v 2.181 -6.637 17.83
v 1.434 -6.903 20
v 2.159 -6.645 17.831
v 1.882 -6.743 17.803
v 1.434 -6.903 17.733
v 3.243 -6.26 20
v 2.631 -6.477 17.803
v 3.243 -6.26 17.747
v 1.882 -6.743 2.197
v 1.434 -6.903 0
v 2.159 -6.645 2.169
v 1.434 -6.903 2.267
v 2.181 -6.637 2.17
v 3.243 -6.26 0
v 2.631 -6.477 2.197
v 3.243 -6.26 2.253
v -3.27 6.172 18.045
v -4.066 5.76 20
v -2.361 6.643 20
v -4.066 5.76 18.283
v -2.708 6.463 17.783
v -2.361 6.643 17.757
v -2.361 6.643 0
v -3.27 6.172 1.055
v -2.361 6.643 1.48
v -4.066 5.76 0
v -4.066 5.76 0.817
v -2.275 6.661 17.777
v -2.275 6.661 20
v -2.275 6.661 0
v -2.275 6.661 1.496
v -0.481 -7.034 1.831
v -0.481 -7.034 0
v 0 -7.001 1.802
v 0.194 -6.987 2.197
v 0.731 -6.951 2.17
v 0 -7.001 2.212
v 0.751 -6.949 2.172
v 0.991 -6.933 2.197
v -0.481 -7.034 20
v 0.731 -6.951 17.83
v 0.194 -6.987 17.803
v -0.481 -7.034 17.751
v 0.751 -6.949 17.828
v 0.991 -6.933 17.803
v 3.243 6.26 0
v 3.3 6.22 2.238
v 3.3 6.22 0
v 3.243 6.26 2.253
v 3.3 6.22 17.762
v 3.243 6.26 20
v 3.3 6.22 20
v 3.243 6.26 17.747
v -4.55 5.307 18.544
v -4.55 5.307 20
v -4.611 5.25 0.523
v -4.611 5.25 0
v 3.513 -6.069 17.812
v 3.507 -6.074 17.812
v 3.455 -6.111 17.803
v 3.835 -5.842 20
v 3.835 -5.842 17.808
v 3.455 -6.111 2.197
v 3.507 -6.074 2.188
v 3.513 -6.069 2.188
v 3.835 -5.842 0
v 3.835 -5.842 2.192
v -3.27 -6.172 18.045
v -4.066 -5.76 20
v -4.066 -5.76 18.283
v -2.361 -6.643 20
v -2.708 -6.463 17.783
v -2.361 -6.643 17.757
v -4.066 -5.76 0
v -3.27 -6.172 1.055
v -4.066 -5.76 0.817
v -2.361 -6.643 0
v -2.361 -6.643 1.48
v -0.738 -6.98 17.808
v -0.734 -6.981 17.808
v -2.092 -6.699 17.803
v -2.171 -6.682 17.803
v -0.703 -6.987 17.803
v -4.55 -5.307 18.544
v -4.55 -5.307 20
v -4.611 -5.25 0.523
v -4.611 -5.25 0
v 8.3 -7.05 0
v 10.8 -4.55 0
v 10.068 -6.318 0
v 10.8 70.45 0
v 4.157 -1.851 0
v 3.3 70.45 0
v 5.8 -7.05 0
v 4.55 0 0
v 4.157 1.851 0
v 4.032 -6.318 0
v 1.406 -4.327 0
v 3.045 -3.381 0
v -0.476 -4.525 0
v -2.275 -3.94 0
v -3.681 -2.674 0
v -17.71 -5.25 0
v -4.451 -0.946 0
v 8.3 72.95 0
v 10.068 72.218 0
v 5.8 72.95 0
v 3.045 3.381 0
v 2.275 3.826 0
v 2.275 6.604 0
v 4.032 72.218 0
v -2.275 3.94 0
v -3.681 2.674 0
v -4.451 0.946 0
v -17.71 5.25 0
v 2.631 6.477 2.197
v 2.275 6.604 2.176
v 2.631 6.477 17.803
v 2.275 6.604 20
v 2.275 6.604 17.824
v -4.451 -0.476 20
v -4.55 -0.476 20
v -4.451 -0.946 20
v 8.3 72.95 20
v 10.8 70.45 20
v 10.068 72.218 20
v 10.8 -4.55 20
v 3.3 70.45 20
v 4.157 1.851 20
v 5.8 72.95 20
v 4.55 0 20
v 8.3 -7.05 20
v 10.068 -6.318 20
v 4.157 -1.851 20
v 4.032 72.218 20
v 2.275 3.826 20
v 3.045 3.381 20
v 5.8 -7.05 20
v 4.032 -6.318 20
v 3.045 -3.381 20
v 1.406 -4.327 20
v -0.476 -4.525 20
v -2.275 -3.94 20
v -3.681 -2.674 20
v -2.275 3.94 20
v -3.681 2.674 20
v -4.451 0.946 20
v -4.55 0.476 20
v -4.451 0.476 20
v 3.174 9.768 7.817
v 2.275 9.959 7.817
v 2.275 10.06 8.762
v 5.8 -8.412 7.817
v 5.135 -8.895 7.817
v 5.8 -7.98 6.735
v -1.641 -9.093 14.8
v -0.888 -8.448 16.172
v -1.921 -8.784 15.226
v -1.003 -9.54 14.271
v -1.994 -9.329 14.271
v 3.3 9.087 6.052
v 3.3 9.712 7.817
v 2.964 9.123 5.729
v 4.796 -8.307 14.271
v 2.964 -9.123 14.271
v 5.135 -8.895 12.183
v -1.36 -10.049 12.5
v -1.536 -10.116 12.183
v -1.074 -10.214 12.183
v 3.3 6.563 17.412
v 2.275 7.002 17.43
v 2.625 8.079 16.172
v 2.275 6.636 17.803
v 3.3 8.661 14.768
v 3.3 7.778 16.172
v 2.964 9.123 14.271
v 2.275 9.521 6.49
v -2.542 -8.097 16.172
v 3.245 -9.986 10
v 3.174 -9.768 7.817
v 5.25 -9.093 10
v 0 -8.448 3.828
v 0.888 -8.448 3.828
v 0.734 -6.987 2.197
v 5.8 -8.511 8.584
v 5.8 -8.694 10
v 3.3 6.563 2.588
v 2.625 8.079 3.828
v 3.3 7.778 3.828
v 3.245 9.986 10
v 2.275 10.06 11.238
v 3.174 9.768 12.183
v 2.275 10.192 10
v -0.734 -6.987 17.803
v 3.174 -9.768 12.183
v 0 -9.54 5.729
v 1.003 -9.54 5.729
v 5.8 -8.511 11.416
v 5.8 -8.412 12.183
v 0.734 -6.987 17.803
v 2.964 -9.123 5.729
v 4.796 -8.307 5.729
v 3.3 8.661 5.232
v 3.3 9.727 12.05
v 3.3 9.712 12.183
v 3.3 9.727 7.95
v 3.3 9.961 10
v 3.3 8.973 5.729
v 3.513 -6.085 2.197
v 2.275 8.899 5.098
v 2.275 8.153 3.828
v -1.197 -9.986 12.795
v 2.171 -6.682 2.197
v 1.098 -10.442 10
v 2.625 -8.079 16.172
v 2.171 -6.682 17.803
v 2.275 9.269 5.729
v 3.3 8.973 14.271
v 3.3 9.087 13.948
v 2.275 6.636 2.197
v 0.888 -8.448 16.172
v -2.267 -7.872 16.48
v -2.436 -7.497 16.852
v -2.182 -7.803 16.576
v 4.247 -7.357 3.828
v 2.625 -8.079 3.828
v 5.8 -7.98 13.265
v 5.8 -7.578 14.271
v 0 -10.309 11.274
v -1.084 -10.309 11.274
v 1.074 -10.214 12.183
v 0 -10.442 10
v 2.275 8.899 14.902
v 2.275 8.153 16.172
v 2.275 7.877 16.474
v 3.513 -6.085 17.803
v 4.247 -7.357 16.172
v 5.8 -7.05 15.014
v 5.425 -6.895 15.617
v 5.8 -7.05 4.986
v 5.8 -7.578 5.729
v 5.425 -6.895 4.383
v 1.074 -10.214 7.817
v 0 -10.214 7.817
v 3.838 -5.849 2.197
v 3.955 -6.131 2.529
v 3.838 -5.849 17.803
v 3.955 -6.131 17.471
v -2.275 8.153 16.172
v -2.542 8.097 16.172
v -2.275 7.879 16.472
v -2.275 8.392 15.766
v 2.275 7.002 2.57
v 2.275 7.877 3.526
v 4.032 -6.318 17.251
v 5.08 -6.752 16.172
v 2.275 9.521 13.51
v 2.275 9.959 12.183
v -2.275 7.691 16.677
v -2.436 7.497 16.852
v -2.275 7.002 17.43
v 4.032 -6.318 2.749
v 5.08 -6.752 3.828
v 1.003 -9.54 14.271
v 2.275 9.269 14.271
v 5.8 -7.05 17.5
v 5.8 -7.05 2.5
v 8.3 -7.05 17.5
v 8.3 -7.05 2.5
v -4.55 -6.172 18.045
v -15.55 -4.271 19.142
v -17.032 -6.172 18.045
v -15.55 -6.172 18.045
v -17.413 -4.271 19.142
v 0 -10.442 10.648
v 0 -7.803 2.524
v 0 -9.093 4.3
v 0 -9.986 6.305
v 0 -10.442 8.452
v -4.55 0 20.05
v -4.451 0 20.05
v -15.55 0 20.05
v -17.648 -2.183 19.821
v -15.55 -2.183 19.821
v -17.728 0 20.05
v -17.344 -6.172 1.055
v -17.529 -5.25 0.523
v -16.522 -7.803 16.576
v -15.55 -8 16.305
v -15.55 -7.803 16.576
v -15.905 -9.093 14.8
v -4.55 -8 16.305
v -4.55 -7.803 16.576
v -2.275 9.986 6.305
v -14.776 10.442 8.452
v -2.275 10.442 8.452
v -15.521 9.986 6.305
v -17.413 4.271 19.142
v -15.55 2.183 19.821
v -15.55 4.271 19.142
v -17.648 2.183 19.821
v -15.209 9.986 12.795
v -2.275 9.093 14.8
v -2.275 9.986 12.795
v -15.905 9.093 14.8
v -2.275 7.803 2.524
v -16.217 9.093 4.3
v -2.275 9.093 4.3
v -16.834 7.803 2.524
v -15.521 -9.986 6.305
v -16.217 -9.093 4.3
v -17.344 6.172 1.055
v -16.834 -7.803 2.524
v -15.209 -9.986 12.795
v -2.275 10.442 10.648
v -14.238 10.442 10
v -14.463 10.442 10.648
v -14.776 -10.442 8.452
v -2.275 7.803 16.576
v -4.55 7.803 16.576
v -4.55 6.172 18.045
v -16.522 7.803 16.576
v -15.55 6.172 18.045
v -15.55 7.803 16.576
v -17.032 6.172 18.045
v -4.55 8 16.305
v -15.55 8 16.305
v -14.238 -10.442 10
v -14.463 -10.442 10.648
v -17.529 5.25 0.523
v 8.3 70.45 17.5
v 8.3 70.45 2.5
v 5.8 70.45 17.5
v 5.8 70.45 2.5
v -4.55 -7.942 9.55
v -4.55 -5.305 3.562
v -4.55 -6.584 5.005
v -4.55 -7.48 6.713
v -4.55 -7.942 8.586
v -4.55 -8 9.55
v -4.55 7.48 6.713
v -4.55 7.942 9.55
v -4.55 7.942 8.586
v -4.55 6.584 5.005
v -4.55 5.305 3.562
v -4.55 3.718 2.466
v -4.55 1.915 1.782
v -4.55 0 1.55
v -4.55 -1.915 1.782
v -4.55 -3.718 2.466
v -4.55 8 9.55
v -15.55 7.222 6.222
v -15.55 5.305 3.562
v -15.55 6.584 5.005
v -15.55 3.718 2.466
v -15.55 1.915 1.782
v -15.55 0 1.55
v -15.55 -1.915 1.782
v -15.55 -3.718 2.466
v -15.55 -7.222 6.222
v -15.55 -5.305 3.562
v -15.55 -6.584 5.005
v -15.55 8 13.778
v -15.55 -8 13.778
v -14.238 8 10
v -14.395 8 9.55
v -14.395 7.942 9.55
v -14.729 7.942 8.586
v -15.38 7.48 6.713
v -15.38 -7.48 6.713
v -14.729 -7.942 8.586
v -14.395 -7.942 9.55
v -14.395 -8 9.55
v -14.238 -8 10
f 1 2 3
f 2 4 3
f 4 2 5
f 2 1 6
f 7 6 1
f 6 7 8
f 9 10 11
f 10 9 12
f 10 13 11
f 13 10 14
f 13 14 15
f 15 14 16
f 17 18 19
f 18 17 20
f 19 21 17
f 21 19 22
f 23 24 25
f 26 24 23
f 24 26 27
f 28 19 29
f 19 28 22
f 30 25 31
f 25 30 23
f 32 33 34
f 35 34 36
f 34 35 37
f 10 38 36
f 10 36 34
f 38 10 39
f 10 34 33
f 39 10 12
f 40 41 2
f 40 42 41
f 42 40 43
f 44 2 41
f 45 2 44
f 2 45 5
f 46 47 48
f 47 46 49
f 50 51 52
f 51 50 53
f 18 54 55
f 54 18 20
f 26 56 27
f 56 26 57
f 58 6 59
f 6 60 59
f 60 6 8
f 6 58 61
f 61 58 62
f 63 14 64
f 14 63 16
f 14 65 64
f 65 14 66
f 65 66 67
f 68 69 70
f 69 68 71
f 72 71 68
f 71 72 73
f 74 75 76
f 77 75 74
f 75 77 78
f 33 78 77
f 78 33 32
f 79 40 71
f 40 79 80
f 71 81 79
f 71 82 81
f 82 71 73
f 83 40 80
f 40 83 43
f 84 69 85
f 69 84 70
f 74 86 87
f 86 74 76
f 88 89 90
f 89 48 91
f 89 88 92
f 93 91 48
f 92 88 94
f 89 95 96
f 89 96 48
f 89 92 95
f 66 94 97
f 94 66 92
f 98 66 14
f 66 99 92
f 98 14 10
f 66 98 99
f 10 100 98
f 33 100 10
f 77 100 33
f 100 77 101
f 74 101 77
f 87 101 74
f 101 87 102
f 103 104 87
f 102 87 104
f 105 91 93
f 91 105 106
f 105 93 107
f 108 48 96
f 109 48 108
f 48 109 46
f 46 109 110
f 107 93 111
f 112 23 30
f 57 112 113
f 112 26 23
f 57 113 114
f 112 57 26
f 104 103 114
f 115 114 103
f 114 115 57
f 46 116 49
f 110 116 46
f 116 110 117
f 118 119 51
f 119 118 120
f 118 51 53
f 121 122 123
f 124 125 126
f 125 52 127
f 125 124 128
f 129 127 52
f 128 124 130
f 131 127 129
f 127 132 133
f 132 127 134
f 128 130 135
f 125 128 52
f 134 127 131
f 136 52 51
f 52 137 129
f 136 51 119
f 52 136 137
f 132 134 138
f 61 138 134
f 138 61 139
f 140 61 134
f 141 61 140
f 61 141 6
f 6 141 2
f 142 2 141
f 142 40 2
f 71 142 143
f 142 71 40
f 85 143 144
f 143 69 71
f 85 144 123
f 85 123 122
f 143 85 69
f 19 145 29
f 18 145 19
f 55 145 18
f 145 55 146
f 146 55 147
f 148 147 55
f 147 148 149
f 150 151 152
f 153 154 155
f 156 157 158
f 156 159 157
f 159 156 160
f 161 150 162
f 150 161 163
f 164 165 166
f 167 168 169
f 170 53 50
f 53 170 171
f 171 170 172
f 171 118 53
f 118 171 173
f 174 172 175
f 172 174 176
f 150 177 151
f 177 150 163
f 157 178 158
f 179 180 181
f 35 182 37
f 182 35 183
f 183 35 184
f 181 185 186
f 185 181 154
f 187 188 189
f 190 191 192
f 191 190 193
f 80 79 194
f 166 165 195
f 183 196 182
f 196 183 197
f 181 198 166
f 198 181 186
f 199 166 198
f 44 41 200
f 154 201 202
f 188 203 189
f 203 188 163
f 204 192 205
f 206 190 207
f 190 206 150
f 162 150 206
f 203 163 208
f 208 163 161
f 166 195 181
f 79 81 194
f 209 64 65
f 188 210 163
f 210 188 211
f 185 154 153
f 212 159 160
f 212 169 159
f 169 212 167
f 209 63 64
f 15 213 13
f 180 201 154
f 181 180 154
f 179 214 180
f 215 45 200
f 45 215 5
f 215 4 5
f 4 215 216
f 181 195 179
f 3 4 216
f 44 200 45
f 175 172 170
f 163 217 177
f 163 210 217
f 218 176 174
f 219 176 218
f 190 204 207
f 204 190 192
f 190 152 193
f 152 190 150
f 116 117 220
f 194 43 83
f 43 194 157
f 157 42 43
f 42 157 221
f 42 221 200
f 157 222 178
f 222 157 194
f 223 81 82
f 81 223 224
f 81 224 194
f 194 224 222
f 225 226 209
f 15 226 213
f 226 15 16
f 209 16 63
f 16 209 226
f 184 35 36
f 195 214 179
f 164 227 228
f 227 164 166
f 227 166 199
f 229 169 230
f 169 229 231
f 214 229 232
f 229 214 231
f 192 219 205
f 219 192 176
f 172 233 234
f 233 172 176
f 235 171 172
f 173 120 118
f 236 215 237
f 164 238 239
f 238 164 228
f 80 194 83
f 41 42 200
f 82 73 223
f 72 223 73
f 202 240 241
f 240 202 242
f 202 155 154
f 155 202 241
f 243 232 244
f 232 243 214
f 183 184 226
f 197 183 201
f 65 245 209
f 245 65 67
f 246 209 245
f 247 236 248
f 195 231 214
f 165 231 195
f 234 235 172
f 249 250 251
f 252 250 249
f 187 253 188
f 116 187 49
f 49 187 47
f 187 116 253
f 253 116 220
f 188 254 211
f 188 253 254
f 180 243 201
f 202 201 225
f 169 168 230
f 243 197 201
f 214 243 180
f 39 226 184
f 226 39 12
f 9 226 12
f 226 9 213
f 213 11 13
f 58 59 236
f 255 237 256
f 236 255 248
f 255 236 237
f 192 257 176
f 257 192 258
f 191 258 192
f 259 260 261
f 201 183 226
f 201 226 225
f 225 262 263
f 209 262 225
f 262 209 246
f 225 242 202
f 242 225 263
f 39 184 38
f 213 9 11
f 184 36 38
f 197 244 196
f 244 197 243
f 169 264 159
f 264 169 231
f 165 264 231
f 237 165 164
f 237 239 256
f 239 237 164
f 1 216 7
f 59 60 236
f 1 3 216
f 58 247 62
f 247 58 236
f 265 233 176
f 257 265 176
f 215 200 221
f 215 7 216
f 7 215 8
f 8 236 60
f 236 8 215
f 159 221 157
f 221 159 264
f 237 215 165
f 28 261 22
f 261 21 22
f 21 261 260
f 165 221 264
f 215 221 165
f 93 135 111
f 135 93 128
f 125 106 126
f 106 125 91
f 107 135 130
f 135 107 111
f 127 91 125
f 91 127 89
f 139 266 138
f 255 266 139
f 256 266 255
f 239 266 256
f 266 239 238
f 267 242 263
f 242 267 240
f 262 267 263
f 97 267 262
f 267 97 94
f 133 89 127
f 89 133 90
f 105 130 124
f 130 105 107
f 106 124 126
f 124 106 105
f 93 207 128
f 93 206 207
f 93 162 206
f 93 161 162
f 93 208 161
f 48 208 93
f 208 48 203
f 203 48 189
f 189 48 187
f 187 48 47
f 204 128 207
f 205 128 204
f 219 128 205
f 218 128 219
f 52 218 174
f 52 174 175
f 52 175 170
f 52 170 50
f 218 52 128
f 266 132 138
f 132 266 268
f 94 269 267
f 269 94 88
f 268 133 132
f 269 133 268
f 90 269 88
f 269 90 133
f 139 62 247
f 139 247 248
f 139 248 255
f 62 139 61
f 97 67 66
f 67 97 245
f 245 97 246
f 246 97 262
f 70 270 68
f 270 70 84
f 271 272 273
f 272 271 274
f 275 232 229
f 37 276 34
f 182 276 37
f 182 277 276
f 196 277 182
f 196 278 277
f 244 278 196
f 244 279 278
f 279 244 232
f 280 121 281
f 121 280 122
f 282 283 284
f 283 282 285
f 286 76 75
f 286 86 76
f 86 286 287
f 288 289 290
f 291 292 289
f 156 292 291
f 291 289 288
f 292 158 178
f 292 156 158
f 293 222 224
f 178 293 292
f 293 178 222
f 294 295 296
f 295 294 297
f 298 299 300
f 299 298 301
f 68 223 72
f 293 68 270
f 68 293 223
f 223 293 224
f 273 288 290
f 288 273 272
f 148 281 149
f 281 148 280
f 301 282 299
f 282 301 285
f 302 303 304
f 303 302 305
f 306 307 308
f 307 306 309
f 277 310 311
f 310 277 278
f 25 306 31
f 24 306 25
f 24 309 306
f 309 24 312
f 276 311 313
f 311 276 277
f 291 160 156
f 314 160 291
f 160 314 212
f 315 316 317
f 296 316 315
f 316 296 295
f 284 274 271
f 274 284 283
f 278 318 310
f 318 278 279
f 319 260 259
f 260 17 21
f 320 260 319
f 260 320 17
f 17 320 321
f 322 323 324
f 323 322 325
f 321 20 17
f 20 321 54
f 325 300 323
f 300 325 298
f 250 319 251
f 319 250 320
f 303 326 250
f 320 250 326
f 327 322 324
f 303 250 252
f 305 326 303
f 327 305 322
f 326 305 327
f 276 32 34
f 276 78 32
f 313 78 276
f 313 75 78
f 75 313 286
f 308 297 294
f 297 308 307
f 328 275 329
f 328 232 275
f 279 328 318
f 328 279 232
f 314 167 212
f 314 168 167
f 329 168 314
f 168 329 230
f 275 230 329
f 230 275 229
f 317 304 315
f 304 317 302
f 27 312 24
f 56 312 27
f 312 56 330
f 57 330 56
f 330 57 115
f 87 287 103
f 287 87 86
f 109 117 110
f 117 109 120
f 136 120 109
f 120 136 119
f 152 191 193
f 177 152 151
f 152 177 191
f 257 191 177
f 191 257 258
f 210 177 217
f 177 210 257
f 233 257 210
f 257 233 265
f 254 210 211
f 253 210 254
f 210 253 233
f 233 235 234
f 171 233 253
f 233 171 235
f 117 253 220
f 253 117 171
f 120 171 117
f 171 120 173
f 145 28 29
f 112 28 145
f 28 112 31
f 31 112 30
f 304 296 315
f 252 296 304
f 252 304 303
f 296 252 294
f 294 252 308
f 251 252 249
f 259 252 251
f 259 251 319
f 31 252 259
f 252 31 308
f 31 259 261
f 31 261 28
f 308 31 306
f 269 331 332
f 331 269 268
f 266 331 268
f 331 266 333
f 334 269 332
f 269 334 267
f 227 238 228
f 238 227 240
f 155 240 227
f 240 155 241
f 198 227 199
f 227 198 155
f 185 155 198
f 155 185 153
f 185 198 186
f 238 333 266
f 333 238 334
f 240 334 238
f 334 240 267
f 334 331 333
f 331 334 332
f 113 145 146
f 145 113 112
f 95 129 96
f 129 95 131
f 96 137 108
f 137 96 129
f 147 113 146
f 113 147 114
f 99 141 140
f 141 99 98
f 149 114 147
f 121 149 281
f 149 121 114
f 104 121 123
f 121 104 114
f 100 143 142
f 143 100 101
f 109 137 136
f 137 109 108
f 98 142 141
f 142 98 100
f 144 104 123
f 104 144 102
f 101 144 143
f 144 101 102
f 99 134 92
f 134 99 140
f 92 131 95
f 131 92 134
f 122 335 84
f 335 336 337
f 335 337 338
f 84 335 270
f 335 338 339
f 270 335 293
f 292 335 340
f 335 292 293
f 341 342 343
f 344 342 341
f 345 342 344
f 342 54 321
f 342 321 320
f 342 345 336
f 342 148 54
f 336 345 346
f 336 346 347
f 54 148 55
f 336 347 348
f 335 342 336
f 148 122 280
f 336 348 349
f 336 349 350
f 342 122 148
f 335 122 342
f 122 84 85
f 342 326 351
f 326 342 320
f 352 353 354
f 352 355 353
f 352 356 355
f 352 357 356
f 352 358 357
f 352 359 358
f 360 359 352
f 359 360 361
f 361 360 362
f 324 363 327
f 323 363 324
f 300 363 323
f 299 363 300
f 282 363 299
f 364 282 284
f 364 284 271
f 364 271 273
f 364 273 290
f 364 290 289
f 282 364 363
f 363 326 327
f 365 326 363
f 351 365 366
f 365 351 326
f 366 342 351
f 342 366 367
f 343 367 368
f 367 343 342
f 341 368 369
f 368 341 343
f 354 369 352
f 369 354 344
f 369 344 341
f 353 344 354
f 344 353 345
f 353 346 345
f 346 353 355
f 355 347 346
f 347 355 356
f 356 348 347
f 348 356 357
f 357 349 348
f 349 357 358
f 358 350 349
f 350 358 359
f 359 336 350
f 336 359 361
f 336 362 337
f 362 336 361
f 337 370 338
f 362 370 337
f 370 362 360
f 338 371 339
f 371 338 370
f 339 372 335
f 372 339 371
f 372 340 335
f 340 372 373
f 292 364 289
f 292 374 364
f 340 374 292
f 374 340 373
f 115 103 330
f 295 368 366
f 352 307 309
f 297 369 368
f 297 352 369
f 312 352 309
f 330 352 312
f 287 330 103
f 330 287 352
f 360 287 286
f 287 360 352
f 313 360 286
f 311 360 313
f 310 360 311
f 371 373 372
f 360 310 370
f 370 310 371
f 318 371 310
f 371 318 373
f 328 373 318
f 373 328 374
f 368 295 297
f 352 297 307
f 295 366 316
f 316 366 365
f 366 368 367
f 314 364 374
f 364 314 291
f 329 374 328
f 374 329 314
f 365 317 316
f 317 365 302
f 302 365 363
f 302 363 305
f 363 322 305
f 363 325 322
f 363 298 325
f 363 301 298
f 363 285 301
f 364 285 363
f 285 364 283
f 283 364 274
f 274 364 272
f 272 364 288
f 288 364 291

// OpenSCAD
//
//  Copyright (C) 24-04-2013 Jasper den Ouden.(ojasper.nl)
//
//  This is free software: you can redistribute it and/or modify
//  it under the terms of the GNU General Public License as published
//  by the Free Software Foundation, either version 3 of the License, or
//  (at your option) any later version.
//

bw = 15; //Blade width.
bt = 2.5; //Thickness.
bl =75;  //..length

mr = 16/2; //Magnet radius.
mh = 11; //Magnet height.

rr = 9.1/2; //Rod radius.

//tw = 8; //tweezers width.

sr = 3.8/2;
sh=4.9;

t = 2.5; //Thicknesses

module tweezersnknife()
{
    rs = (mr+t)/2;
    difference()
    {   union()
        {   cylinder(r=rr+t,h=bw + 2*t);
            translate([0,0,bw/2+t]) sphere(mr+t);
            translate([rr+t/2,-rr]) linear_extrude(height=bw+2*t) minkowski()
            {   square([bt,bl]);
                circle(t);
            }
            translate([0,0,rr+2*t]) rotate([0,-90,0]) cylinder(r=mr+t, h=rr+t+mh);
            translate([-rr-mh-t,-rs]) cube([mh+2*rr+2*t,2*rs,bw+t]);
        }
        translate([-rr/2,0]) cube([rr,mr+t,2*(bw+t)]);
        
        translate([rr+t/2,-bl-rr,t]) cube([bt,2*bl,bw]);
        cylinder(r=rr,h=2*(bw+t));
        translate([-rr,0,rr+2*t]) rotate([0,-90,0]) linear_extrude(height=mh)
        {   circle(mr);
            translate([mr,0]) square(2*[mr,mr],center=true); 
            //cylinder(r=mr, h=2*(mh+t));
        }
        translate([0,0,-bl]) cube(bl*[2,2,2], center=true);
        translate([-rr-t-mh,0,bw/2+t]) scale([t/mr,1.5,0.9]) rotate([90,0,0])
            rotate(45) cube([2*mr+t/2,2*mr+t/2,2*bw], center=true);
//            cylinder(r= mr, h = 2*bw);
    }
}

tweezersnknife();
